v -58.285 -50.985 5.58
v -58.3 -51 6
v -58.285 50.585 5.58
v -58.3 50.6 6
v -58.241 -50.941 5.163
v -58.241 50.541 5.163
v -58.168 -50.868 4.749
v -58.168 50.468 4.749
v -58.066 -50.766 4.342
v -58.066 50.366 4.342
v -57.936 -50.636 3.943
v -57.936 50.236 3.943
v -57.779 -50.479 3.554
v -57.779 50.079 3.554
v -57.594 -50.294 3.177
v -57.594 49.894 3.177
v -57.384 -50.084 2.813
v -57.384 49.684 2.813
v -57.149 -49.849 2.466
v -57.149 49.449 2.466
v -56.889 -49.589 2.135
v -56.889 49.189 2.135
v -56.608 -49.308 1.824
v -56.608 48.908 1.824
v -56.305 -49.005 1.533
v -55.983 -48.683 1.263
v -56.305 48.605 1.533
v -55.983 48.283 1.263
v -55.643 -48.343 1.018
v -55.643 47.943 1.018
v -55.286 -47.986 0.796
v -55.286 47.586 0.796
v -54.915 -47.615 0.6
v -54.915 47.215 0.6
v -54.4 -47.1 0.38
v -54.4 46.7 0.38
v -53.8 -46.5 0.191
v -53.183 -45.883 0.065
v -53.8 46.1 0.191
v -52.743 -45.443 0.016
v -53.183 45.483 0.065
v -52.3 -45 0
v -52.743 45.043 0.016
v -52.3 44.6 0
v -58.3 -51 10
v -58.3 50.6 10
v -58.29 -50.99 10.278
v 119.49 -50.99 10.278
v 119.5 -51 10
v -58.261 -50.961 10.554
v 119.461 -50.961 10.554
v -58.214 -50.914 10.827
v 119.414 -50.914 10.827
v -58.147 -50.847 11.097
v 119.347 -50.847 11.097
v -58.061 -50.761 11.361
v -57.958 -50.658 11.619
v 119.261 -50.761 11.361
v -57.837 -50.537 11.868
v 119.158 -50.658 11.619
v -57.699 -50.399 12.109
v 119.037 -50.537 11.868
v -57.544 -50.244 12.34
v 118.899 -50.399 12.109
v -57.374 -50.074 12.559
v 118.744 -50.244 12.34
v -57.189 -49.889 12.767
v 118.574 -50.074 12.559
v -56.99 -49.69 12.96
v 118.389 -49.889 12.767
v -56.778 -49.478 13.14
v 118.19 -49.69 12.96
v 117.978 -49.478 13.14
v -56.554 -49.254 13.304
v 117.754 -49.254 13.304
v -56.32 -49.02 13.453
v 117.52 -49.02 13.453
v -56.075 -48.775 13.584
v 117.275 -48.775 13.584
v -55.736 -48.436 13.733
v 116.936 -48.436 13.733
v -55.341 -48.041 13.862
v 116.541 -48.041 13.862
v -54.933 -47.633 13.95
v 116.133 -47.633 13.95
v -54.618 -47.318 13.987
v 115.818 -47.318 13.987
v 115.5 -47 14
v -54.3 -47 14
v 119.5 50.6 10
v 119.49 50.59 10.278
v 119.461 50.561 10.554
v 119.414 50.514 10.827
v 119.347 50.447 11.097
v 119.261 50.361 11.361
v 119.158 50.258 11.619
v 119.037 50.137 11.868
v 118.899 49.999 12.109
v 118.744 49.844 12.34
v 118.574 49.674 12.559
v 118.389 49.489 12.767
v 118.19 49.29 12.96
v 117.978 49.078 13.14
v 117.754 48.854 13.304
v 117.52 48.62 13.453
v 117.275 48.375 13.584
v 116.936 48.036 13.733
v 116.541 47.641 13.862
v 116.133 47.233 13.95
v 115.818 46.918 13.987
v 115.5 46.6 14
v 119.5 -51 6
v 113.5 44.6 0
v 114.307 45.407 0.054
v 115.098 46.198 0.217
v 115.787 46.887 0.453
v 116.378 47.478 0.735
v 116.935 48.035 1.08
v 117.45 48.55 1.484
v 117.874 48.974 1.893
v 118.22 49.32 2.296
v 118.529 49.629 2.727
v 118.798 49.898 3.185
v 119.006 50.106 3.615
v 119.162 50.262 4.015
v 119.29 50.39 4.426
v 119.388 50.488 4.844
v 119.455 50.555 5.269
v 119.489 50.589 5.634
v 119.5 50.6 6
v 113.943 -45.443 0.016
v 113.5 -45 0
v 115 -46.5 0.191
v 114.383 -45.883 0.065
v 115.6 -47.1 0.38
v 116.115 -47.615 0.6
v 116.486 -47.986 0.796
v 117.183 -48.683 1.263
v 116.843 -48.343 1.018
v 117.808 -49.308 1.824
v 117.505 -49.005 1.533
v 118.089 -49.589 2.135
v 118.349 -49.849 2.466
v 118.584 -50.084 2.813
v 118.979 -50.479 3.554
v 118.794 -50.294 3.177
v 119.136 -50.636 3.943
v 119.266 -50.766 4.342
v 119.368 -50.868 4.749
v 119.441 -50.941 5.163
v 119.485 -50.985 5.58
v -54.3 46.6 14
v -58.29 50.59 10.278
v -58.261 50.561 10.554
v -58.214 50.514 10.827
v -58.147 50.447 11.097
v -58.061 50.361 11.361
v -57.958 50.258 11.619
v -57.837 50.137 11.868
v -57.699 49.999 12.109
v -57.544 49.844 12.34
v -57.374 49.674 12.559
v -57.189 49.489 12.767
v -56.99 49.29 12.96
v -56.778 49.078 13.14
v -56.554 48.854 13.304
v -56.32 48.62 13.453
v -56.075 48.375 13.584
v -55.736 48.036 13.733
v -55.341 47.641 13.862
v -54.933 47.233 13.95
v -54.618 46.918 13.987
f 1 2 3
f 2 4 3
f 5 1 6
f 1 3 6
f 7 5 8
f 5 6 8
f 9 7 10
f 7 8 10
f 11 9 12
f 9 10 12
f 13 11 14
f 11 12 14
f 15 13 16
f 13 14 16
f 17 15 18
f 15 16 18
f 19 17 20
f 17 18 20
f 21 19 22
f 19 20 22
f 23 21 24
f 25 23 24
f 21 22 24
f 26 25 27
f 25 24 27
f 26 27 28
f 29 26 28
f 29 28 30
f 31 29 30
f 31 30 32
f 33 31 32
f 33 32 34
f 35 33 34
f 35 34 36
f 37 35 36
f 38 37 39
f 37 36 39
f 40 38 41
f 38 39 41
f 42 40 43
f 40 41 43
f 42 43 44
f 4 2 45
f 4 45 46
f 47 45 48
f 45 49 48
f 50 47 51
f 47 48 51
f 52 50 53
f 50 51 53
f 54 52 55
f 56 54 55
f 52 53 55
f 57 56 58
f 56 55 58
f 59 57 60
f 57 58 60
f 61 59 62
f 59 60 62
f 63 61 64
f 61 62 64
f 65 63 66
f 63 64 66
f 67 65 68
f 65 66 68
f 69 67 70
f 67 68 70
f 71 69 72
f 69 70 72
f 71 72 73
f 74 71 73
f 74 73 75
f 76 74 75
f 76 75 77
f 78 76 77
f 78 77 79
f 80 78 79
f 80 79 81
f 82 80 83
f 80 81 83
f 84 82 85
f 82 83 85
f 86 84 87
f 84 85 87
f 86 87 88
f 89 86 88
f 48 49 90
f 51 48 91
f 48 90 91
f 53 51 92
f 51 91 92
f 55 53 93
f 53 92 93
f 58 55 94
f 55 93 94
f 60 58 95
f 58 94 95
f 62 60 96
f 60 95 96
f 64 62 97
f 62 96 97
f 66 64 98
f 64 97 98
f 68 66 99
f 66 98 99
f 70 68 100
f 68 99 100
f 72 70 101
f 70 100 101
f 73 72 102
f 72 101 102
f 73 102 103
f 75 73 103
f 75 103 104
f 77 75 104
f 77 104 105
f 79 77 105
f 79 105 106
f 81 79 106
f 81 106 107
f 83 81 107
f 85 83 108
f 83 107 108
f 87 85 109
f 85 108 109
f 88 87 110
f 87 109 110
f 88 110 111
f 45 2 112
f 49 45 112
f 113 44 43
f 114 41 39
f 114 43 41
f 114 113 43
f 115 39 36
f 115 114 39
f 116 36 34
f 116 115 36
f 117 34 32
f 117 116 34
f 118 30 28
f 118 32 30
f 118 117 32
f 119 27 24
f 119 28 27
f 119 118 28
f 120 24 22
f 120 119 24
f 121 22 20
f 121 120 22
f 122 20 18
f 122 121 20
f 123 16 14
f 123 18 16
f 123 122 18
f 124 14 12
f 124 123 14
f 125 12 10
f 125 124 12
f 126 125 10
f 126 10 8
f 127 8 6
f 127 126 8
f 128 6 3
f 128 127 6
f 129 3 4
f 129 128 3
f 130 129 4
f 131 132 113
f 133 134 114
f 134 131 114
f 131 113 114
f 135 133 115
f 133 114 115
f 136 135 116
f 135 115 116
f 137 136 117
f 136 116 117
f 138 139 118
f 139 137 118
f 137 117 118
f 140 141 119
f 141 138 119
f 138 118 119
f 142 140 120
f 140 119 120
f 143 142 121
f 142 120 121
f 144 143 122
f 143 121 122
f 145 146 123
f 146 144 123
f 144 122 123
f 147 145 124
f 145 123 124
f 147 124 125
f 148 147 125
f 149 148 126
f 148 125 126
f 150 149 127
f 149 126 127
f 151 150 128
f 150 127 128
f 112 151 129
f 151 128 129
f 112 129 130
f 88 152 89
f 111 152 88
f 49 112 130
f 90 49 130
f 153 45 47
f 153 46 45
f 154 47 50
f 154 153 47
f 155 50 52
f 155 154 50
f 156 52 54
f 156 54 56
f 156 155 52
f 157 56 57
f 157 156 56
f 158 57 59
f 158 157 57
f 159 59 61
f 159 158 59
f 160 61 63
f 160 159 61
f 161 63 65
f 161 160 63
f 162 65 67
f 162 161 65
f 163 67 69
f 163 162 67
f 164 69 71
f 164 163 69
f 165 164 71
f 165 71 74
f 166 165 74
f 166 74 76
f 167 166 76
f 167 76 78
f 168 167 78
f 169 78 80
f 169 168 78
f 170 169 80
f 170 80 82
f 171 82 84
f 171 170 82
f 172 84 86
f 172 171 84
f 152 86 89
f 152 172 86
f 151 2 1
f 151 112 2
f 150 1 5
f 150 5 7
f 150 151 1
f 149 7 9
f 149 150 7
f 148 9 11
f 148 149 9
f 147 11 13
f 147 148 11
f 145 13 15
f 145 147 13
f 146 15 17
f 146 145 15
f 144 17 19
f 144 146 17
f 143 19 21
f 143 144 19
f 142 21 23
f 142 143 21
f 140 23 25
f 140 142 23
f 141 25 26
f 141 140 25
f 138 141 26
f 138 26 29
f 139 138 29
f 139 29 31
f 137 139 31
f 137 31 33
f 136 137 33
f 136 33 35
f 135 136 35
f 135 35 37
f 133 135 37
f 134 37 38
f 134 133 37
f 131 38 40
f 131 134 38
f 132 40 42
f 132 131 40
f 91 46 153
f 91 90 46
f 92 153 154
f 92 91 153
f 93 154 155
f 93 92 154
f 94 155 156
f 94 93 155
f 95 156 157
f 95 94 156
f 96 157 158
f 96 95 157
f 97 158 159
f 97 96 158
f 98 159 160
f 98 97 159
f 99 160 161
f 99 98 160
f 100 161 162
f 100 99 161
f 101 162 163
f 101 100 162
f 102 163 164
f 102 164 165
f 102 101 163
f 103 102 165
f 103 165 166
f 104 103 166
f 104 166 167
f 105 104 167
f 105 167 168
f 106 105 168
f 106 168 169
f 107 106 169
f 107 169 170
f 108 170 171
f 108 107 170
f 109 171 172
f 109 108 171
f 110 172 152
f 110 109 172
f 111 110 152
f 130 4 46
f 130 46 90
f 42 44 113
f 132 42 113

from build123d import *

# Parameters (mm, degrees)
F0_W     = 177.8
F0_H     = 101.6
F1_DEPTH = 14
F2_R     = 4
F3_R     = 6


with BuildPart() as f1:
    # F0 (on Top) → F1 (new body)
    with BuildSketch(Plane.XY):
        with Locations((30.6, -0.2)):
            Rectangle(F0_W, F0_H)
    extrude(amount=F1_DEPTH)

    # F2
    f2_edges = [f1.edges().sort_by_distance(p)[0] for p in [
        (-58.3, -0.2, 14),
        (30.6, 50.6, 14),
        (30.6, -51, 14),
        (119.5, -0.2, 14),
    ]]
    fillet(f2_edges, radius=F2_R)

    # F3
    f3_edges = [f1.edges().sort_by_distance(p)[0] for p in [
        (-58.3, -0.2, 0),
        (30.6, 50.6, 0),
        (30.6, -51, 0),
        (119.5, -0.2, 0),
    ]]
    fillet(f3_edges, radius=F3_R)


solid = f1.part
